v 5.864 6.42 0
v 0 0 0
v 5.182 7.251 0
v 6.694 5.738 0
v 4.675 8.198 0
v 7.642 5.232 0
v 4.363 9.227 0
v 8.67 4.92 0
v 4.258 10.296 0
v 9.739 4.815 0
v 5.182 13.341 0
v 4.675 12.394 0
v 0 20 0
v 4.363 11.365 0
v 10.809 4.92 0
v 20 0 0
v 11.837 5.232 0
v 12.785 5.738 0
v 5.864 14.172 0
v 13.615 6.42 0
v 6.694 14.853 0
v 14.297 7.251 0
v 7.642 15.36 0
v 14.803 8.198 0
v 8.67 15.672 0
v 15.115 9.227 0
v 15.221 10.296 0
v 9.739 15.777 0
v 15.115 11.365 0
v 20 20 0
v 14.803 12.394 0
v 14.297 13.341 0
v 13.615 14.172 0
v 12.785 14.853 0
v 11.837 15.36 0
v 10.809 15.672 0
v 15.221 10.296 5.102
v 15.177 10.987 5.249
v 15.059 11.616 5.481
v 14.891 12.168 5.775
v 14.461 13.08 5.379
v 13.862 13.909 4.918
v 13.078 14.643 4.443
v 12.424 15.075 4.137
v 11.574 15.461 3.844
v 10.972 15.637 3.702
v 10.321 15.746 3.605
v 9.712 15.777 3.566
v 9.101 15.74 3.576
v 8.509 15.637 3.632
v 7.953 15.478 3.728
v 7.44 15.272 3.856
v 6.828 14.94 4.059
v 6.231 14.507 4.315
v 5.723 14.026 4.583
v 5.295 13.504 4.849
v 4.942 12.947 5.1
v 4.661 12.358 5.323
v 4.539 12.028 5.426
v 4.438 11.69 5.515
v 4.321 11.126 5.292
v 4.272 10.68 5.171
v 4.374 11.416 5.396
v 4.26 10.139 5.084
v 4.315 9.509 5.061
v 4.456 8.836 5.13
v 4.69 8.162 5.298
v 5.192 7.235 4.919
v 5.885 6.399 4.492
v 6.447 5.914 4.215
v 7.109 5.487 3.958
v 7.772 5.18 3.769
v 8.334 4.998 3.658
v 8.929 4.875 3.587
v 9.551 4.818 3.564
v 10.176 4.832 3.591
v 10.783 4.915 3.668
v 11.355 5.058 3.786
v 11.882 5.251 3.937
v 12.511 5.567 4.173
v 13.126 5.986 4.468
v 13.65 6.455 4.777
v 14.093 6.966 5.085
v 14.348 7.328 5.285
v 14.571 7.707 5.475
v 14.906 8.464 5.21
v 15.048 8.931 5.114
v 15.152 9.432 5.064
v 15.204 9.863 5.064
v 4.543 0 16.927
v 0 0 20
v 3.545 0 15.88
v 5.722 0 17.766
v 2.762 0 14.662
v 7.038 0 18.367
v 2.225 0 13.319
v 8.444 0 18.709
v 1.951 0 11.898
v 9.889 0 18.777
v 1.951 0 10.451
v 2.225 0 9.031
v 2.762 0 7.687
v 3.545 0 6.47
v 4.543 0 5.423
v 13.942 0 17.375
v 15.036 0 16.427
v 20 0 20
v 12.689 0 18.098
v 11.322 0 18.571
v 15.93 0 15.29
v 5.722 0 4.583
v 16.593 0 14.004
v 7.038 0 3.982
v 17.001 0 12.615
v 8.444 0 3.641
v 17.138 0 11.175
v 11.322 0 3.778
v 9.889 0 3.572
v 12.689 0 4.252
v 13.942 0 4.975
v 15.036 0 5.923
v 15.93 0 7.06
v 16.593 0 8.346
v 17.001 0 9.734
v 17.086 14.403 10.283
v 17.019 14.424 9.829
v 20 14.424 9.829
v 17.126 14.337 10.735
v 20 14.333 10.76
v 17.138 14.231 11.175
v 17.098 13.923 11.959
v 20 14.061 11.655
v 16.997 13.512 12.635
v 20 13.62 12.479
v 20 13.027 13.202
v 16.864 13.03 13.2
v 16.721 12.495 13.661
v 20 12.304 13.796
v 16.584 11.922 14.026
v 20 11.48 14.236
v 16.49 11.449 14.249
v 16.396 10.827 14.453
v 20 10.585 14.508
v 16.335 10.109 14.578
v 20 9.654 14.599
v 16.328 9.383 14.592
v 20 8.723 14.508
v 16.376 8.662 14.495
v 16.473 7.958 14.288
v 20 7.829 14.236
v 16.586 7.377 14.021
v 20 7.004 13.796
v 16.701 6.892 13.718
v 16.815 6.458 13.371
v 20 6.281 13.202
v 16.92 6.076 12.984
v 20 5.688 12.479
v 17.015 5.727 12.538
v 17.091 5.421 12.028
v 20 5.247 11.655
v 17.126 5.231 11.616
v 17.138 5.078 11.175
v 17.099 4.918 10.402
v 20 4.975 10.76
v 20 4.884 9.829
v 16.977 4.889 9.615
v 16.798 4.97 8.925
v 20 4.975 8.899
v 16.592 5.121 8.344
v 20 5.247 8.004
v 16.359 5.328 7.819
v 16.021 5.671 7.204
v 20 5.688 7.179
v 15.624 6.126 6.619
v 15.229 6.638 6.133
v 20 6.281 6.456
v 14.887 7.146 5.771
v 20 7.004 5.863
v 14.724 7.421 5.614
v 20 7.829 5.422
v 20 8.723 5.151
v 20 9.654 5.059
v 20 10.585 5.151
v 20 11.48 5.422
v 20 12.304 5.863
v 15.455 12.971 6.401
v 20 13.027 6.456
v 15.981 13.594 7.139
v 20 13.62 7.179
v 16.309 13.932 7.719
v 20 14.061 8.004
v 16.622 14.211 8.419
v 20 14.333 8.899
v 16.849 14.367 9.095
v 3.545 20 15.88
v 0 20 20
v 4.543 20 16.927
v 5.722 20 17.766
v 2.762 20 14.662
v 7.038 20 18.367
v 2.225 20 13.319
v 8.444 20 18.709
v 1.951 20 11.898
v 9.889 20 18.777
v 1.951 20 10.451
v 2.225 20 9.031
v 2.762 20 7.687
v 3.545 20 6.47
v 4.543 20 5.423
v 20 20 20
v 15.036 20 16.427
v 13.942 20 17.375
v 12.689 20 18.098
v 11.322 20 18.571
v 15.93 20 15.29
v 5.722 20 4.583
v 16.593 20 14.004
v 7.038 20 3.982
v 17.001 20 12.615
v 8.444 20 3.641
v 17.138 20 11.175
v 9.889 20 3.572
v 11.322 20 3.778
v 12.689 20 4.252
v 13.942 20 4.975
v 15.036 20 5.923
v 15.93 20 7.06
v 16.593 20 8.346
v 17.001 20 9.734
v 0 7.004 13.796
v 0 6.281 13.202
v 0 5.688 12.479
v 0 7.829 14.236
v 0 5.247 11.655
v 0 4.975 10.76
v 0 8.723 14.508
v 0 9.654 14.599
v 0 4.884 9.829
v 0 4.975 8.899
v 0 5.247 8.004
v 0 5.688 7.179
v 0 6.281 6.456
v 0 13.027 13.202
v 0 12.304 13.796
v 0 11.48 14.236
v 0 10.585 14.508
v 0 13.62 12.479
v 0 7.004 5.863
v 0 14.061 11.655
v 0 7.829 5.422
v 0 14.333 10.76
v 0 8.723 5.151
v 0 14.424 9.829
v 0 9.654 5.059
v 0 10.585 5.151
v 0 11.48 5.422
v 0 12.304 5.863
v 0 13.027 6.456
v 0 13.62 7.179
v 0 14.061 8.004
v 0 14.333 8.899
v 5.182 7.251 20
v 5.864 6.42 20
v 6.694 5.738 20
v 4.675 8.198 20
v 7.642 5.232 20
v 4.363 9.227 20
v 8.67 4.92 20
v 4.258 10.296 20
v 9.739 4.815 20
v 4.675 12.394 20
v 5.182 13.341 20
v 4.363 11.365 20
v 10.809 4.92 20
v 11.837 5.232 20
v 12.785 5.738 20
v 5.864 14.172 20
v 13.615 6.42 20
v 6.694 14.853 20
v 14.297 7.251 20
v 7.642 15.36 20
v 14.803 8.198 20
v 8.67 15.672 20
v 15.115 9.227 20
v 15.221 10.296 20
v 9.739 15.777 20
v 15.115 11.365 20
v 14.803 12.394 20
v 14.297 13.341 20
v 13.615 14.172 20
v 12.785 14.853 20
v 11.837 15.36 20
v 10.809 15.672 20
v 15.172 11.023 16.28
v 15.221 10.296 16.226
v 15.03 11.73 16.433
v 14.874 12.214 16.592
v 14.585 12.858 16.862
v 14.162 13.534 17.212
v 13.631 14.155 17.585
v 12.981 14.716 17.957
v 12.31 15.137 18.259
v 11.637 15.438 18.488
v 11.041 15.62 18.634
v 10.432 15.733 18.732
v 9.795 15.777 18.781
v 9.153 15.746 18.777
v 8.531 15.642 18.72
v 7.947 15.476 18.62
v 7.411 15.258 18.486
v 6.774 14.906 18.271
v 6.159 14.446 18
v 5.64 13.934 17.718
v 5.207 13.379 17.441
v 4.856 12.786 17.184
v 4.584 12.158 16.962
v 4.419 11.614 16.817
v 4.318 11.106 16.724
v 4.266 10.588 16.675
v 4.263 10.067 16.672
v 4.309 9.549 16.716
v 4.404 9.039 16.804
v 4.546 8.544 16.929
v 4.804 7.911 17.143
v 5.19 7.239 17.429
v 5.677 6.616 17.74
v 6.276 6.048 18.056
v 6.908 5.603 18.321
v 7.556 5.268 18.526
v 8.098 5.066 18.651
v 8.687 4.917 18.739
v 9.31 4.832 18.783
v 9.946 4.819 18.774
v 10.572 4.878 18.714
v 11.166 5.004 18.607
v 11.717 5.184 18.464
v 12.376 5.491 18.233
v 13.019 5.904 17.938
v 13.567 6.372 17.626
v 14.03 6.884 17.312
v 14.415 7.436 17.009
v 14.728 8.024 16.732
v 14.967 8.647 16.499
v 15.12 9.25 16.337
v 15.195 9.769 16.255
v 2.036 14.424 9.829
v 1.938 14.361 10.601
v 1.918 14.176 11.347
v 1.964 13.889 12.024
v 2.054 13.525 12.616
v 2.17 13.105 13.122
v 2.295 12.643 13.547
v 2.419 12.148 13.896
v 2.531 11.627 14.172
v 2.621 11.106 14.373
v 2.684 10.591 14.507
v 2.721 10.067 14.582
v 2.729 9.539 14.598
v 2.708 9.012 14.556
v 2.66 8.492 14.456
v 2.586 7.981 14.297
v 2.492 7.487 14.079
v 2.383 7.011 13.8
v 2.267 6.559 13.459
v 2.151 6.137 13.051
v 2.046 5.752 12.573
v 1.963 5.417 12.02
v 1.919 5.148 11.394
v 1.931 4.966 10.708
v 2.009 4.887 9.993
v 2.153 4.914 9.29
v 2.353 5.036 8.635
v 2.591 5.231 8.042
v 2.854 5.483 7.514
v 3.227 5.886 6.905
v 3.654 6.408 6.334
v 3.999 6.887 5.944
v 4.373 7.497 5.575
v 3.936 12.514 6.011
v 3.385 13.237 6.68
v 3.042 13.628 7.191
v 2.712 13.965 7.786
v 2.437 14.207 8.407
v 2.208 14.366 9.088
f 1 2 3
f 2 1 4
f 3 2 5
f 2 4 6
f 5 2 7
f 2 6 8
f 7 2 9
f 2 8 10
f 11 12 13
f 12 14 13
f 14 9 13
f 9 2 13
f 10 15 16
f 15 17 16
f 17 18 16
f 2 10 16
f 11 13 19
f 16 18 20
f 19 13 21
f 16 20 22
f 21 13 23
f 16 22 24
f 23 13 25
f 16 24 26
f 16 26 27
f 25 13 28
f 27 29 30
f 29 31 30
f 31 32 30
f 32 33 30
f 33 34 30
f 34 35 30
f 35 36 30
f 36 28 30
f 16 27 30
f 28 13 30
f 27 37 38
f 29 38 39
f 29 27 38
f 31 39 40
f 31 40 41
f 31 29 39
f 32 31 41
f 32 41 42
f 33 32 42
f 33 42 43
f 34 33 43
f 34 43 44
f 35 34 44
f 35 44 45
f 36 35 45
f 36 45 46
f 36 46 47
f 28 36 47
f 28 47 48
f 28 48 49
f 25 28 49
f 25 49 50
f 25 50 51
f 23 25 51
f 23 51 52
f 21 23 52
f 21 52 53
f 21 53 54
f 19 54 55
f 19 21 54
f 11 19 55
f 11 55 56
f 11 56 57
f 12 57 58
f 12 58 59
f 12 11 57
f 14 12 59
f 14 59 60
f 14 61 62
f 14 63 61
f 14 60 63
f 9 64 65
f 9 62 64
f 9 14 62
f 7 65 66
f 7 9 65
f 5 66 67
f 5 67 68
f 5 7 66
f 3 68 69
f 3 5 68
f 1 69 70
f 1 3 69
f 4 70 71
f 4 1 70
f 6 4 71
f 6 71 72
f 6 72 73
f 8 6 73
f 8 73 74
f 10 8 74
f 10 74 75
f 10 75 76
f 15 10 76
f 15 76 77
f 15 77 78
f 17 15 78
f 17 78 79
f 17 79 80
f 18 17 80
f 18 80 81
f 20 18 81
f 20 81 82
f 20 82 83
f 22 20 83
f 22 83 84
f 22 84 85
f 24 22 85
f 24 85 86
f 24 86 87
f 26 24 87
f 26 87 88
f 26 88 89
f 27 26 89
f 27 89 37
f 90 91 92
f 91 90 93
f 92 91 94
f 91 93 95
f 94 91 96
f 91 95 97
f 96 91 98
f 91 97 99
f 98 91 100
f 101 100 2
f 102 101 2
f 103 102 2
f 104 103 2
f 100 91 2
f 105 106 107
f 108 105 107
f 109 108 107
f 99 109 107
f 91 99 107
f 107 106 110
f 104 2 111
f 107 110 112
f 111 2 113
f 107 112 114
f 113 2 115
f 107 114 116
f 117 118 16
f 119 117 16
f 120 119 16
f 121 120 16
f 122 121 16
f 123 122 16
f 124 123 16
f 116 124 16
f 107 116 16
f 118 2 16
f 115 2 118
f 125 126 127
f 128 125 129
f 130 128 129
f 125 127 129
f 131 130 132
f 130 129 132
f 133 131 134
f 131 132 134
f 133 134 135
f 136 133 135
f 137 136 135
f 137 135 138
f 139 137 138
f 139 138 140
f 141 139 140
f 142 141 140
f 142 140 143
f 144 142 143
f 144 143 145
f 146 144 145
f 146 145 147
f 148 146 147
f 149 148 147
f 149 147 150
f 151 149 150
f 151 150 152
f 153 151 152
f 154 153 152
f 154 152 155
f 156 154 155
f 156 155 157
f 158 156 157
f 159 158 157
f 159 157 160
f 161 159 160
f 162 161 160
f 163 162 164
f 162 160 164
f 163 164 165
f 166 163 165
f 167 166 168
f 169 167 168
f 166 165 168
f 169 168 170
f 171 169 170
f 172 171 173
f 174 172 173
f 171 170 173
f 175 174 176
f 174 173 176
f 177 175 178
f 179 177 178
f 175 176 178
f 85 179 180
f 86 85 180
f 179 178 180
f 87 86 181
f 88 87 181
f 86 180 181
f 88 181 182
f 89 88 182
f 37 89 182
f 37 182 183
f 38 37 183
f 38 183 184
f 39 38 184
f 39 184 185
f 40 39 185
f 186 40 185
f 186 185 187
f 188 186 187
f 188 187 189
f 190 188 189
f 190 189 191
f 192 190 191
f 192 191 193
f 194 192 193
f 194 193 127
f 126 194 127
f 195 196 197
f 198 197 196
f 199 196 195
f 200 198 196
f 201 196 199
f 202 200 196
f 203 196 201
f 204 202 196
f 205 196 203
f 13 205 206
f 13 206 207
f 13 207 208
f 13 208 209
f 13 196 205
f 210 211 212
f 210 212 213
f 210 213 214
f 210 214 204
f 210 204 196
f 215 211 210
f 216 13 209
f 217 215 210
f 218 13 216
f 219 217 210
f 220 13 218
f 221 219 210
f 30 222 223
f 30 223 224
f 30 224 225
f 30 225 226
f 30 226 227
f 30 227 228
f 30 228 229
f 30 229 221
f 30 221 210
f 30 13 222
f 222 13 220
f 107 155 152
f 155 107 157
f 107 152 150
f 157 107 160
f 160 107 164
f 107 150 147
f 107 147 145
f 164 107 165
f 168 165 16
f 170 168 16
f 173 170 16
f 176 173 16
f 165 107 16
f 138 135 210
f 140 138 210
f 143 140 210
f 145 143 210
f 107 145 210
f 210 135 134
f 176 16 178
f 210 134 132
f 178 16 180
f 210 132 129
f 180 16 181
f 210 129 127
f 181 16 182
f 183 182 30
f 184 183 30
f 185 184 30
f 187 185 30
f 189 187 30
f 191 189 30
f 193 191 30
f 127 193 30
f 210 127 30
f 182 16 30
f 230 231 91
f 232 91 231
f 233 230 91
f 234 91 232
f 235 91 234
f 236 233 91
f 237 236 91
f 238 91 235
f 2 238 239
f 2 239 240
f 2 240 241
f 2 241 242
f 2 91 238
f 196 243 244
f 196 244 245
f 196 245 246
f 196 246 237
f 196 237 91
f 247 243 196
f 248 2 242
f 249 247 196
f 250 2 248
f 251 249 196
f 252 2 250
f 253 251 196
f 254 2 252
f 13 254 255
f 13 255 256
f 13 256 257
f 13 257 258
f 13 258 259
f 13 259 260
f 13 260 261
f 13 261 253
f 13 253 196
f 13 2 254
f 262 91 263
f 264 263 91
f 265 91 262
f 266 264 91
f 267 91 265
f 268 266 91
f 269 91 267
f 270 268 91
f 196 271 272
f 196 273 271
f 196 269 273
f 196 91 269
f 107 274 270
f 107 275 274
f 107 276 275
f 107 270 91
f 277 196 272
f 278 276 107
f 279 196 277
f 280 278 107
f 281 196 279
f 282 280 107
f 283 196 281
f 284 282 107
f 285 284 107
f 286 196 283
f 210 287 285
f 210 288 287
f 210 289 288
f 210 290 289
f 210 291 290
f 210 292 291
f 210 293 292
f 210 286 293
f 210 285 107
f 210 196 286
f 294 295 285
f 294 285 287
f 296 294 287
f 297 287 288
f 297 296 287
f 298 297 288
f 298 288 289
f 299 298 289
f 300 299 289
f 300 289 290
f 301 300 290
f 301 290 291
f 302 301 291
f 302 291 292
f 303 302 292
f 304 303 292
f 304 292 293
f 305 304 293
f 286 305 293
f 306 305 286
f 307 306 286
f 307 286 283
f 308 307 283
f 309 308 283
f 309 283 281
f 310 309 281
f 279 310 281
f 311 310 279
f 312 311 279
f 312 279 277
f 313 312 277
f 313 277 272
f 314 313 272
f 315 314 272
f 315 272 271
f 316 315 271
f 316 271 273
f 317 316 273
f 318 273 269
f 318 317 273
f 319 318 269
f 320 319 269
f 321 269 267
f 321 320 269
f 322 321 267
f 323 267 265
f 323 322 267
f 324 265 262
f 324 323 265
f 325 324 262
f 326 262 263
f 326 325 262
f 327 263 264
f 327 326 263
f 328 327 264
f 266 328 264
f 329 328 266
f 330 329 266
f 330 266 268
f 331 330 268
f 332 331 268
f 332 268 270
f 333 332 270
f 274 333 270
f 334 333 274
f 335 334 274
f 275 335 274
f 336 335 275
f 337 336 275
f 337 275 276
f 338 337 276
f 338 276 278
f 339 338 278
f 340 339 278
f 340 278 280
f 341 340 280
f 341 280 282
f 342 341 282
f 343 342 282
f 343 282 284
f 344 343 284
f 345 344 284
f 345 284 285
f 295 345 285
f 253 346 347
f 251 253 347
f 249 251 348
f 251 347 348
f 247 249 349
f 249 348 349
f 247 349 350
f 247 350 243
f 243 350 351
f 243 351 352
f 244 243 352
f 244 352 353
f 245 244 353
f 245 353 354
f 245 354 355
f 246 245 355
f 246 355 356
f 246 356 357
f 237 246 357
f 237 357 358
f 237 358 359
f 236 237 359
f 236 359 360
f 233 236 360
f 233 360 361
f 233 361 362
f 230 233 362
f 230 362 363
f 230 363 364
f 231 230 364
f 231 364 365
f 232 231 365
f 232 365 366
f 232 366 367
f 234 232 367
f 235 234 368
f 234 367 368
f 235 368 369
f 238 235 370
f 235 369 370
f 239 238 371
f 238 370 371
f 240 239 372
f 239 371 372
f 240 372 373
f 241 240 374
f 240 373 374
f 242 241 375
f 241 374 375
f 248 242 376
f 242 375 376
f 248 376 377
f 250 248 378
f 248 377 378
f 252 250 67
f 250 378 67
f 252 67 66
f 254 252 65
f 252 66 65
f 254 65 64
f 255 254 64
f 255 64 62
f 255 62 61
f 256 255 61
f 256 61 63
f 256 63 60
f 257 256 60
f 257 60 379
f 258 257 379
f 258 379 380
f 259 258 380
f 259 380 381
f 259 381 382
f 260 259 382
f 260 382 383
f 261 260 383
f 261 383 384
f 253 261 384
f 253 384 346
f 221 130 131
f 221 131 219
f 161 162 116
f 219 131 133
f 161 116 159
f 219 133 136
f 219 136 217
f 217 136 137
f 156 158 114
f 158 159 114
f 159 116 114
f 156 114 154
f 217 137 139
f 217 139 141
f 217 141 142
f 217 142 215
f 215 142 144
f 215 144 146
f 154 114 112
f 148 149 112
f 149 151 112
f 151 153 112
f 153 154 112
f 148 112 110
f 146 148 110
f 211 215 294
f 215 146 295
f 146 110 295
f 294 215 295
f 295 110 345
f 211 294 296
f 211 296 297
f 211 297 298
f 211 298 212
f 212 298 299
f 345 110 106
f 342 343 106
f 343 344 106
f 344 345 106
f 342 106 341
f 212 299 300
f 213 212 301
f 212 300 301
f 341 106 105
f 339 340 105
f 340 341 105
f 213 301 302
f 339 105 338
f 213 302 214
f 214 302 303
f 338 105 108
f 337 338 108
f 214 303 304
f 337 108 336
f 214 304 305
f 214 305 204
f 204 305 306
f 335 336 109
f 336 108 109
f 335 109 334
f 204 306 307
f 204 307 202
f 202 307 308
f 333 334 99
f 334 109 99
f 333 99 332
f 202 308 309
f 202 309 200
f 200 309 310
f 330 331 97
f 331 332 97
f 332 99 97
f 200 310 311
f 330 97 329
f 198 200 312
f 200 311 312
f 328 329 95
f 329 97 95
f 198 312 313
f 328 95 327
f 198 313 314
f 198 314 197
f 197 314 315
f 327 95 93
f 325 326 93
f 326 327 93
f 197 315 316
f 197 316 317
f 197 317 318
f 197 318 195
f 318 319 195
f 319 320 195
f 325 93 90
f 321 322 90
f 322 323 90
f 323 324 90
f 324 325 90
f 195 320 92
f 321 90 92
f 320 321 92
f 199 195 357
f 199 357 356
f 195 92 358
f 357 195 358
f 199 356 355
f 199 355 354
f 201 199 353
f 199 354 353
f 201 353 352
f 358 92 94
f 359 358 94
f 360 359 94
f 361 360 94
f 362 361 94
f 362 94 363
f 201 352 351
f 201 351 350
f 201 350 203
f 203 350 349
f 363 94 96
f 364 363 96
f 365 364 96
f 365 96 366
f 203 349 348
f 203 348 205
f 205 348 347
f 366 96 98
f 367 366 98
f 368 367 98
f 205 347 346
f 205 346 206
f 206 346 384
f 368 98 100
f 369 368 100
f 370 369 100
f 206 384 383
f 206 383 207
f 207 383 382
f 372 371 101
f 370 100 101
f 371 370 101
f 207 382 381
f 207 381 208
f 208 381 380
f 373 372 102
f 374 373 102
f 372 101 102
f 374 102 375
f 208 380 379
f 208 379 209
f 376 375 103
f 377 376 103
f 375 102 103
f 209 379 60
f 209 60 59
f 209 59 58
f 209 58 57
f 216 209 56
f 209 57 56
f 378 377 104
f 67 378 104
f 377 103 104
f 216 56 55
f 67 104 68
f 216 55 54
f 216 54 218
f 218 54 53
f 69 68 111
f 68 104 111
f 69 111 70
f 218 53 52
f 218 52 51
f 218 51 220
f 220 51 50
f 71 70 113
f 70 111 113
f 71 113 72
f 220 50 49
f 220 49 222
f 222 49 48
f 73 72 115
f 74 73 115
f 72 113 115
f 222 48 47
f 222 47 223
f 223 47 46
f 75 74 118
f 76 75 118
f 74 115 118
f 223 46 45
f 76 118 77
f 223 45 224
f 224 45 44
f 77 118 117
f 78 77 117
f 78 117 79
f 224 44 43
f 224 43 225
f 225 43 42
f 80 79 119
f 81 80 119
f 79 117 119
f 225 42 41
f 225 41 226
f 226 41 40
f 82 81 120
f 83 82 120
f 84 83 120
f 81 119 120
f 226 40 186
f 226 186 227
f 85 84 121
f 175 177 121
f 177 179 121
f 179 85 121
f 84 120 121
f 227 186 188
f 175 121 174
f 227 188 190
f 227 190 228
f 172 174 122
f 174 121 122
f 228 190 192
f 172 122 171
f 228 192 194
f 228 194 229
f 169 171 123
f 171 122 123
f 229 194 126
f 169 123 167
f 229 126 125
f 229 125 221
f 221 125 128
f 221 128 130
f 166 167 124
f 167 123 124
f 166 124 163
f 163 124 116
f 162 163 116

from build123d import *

# Parameters (mm, degrees)
F0_W       = 20
F0_H       = 20
F1_DEPTH   = 20
F2_R       = 5.4812551749
F1_FACE_W  = 20
F1_FACE_H  = 20
F3_DEPTH   = 20
F4_R       = 4.7702363178
F1_FACE2_W = 20
F1_FACE2_H = 20
F5_DEPTH   = 20
F6_R       = 7.6111370414
F7_DEPTH   = 20


with BuildPart() as f1:
    # F0 (on Top) → F1 (new body)
    with BuildSketch(Plane.XY):
        with Locations((10, 10)):
            Rectangle(F0_W, F0_H)
    extrude(amount=F1_DEPTH)

    # F2 (on Top) + F1_face (on face) → F3 (cut)
    with BuildSketch(Plane.XY):
        with Locations((9.7394008189, 10.2959359065)):
            Circle(F2_R)
    with BuildSketch(Plane(origin=(10, 10, 20), x_dir=(1, 0, 0), z_dir=(0, 0, 1))):
        Rectangle(F1_FACE_W, F1_FACE_H)
    extrude(amount=F3_DEPTH, mode=Mode.SUBTRACT)

    # F4 (on face) + F1_face2 (on face) → F5 (cut)
    with BuildSketch(Plane.YZ.offset(20)):
        with Locations((9.6540758386, 9.8292576149)):
            Circle(F4_R)
    with BuildSketch(Plane(origin=(0, 10, 10), x_dir=(0, -1, 0), z_dir=(-1, 0, 0))):
        Rectangle(F1_FACE2_W, F1_FACE2_H)
    extrude(amount=-F5_DEPTH, dir=(1, 0, 0), mode=Mode.SUBTRACT)

    # F6 (on face) → F7 (cut)
    with BuildSketch(Plane.XZ):
        with Locations((9.5273330808, 11.1748687923)):
            Circle(F6_R)
    extrude(amount=-F7_DEPTH, mode=Mode.SUBTRACT)


solid = f1.part
